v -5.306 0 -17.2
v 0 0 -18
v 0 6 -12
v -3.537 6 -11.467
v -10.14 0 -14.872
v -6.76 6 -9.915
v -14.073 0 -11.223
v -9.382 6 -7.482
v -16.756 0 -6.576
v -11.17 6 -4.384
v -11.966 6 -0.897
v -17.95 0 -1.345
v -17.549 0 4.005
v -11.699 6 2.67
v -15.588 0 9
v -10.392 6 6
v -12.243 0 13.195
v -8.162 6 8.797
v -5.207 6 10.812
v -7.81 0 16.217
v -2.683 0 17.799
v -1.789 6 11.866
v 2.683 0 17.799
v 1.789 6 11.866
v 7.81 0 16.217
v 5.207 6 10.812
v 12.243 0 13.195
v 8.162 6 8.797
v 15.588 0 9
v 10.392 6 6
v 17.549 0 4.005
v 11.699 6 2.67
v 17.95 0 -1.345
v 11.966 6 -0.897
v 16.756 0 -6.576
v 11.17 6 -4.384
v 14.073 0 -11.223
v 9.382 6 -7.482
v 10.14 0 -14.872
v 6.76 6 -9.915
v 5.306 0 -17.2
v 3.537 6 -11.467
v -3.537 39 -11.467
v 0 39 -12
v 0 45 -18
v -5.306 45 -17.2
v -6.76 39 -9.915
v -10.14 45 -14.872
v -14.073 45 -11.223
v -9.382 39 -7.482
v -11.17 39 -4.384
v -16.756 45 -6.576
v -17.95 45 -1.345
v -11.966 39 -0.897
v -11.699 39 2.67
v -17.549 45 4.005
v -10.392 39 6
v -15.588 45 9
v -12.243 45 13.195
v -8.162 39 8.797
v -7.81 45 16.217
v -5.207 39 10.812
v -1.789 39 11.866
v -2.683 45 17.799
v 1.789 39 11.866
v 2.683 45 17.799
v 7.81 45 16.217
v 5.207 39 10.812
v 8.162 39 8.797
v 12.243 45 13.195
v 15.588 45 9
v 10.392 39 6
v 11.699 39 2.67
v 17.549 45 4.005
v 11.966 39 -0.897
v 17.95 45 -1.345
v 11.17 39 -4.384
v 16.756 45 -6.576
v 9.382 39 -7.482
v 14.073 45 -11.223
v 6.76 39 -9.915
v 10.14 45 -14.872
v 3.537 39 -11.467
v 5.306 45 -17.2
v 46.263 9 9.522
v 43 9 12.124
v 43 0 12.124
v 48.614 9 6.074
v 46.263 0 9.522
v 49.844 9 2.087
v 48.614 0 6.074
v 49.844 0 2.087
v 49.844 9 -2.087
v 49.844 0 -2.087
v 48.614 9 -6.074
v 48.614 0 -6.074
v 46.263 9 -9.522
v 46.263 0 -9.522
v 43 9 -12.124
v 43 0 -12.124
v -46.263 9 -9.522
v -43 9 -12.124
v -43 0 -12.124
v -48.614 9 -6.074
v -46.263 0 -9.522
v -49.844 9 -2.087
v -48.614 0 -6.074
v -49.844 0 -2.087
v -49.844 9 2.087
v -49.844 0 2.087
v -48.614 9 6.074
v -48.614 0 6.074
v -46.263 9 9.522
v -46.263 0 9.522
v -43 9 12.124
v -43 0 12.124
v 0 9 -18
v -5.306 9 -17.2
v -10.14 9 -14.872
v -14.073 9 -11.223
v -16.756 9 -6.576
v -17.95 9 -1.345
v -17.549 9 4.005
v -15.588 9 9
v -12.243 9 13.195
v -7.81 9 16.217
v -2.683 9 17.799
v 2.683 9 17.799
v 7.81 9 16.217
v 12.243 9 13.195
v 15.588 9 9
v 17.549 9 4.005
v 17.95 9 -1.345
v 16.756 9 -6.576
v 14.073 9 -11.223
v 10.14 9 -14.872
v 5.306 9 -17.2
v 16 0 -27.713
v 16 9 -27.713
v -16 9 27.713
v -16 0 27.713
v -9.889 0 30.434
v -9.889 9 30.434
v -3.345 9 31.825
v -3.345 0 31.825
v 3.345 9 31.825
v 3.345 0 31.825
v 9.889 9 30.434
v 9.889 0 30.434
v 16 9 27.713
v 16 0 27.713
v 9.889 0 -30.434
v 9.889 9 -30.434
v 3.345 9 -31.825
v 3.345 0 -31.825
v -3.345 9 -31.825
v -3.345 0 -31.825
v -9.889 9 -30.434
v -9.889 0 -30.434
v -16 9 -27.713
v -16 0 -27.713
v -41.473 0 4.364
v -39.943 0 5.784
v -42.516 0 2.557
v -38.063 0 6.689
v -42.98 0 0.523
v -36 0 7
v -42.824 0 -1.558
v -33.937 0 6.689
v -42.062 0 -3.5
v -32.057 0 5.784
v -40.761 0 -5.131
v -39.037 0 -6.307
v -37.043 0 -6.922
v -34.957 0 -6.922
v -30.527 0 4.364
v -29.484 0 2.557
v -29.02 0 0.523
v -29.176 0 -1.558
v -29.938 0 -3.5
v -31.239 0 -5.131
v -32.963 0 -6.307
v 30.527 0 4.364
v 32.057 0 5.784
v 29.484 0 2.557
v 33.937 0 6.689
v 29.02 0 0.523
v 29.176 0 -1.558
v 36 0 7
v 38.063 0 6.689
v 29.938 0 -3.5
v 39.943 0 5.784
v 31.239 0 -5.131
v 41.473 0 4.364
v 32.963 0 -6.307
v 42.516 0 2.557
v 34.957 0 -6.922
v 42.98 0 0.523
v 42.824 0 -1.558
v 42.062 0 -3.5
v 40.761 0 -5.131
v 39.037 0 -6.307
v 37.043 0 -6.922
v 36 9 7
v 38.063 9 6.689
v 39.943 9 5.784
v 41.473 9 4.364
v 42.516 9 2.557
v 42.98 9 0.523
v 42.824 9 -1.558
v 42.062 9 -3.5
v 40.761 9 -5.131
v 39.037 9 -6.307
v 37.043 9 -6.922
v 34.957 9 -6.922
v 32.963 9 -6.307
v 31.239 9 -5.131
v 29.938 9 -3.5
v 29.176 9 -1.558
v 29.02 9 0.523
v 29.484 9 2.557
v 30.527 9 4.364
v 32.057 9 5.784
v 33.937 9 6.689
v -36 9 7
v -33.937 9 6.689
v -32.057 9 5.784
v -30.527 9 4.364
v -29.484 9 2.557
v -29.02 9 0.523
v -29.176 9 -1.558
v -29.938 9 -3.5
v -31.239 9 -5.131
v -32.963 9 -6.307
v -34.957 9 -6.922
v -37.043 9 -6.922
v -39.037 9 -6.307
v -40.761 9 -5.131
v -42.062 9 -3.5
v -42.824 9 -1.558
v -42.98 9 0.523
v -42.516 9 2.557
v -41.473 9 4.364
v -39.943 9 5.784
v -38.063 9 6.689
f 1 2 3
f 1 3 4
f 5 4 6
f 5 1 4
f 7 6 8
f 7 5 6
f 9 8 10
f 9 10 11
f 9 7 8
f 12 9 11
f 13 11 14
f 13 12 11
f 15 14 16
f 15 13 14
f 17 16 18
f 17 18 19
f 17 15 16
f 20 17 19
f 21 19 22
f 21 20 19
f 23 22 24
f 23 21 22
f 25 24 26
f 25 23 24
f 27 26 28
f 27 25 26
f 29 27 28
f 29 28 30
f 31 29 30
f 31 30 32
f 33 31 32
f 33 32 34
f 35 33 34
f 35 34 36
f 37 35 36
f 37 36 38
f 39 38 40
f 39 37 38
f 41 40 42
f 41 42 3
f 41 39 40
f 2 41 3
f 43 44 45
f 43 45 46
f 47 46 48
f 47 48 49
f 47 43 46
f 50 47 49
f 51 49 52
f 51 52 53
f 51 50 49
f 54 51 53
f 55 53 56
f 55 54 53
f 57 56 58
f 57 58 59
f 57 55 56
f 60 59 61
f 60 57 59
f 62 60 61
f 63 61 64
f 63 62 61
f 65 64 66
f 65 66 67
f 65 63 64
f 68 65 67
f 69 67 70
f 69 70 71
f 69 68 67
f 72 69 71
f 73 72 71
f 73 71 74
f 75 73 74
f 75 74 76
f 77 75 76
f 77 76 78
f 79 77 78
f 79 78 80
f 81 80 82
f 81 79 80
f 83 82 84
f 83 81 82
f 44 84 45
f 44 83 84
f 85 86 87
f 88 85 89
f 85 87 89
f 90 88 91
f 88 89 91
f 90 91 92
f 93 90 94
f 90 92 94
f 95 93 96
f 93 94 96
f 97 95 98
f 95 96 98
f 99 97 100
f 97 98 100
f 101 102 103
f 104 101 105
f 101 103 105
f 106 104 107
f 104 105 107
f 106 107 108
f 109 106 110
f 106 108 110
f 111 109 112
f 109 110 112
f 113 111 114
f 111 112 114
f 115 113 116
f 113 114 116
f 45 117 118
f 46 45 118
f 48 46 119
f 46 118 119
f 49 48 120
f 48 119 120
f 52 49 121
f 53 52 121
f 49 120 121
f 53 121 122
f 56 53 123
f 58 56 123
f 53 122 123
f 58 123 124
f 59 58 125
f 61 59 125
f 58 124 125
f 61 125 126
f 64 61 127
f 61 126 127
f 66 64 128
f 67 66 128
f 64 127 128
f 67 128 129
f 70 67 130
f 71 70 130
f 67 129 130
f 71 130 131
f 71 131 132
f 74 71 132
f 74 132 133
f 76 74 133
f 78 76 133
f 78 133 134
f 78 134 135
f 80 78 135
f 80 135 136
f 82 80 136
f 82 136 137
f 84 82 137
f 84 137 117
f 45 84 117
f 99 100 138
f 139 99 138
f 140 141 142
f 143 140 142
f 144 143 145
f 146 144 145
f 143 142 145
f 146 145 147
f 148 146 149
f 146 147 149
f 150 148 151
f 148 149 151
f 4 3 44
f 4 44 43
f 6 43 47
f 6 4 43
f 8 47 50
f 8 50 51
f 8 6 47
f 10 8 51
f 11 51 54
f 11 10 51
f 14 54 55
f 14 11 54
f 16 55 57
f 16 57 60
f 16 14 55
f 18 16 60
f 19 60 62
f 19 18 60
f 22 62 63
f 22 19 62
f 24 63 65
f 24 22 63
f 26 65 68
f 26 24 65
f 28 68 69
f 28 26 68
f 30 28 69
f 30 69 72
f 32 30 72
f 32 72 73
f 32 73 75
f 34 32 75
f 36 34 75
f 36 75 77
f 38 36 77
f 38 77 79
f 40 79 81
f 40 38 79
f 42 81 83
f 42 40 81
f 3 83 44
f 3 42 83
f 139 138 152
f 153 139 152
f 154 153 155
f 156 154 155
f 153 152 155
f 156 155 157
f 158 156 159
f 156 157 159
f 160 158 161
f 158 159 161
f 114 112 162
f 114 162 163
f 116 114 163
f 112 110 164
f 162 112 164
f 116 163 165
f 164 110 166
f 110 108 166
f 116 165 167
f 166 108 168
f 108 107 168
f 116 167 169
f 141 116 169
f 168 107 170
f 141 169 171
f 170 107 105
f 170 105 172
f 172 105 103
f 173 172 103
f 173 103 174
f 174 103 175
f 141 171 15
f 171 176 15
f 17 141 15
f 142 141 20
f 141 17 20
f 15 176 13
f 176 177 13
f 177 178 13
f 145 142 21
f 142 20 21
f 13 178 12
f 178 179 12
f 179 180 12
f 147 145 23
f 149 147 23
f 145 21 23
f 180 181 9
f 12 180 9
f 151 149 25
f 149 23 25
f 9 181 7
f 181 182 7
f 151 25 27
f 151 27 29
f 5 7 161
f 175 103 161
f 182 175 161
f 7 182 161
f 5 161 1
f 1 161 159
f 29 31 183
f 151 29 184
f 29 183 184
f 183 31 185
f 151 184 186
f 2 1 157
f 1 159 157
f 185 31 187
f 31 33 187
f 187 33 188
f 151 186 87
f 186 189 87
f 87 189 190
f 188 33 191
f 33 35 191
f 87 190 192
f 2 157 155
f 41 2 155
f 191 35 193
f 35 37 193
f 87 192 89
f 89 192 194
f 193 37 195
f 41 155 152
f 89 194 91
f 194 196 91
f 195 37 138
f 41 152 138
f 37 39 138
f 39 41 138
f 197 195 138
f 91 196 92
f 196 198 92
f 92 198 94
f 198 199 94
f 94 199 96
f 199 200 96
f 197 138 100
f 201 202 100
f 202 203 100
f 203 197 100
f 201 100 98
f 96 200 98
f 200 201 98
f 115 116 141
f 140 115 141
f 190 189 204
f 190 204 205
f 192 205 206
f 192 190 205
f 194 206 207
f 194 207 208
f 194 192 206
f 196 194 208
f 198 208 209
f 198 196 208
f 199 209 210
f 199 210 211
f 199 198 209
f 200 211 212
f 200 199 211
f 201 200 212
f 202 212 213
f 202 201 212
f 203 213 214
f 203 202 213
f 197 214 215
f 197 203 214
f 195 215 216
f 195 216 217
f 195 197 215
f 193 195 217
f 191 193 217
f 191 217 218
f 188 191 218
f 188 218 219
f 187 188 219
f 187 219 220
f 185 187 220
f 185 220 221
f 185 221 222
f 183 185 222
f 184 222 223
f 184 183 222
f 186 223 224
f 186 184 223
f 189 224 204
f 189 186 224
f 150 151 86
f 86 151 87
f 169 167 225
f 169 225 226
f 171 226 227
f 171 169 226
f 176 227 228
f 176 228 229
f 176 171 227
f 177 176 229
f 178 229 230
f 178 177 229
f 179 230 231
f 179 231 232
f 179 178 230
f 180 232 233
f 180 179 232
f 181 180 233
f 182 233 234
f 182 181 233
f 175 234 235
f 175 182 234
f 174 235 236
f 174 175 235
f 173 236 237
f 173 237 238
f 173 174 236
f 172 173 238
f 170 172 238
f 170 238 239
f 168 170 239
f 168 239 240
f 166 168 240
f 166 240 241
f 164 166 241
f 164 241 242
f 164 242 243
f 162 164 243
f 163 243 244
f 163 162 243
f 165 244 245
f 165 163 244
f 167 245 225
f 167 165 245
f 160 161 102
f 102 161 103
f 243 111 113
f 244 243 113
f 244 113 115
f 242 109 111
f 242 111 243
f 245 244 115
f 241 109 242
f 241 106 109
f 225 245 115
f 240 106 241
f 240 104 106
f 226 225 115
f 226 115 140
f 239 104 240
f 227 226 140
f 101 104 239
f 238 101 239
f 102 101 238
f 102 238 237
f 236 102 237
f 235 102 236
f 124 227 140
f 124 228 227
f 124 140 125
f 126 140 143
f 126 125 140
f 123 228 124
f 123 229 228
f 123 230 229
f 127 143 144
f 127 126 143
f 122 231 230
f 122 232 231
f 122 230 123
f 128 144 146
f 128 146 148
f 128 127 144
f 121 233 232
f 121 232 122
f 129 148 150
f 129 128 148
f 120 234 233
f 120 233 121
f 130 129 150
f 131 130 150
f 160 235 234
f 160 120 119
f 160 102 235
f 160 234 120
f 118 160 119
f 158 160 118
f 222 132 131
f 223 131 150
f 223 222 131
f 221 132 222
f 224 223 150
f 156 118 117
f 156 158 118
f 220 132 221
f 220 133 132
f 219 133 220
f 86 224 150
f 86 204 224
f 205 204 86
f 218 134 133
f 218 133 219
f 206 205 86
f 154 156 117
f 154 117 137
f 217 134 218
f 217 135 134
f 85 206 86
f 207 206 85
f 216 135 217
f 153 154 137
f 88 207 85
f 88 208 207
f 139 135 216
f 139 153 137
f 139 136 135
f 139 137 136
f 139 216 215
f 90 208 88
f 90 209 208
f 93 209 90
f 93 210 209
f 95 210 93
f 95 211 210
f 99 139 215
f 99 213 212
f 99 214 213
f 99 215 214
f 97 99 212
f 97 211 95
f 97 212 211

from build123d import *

# Parameters (mm, degrees)
SKETCH_1_R      = 7
SKETCH_1_R_2    = 18
EXTRUDE_1_DEPTH = 9
SKETCH_1_3_R    = 18
SKETCH_1_3_R_2  = 12
EXTRUDE_2_DEPTH = 45
CHAMFER_1_SIZE  = 6


with BuildPart() as part:
    # 草圖1 → 填料-伸長1 (new body)
    with BuildSketch(Plane(origin=(0, 0, 0), x_dir=(1, 0, 0), z_dir=(0, 1, 0))):
        with BuildLine():
            Line((16, -27.712812921), (43, -12.124355653))
            ThreePointArc((43, -12.124355653), (50, 0), (43, 12.124355653))
            Line((43, 12.124355653), (16, 27.712812921))
            ThreePointArc((16, 27.712812921), (0, 32), (-16, 27.712812921))
            Line((-16, 27.712812921), (-43, 12.124355653))
            ThreePointArc((-43, 12.124355653), (-50, 0), (-43, -12.124355653))
            Line((-43, -12.124355653), (-16, -27.712812921))
            ThreePointArc((-16, -27.712812921), (0, -32), (16, -27.712812921))
        make_face()
        with Locations(Location((36, 0, 0), (0, 0, 270))):
            Circle(SKETCH_1_R, mode=Mode.SUBTRACT)
        with Locations(Location((-36, 0, 0), (0, 0, 270))):
            Circle(SKETCH_1_R, mode=Mode.SUBTRACT)
        with Locations(Location((0, 0, 0), (0, 0, 270))):
            Circle(SKETCH_1_R_2, mode=Mode.SUBTRACT)
    extrude(amount=EXTRUDE_1_DEPTH)

    # 草圖1<3> → 填料-伸長2 (add)
    with BuildSketch(Plane(origin=(0, 0, 0), x_dir=(1, 0, 0), z_dir=(0, 1, 0))):
        with Locations(Location((0, 0, 0), (0, 0, 90))):
            Circle(SKETCH_1_3_R)
        with Locations(Location((0, 0, 0), (0, 0, 90))):
            Circle(SKETCH_1_3_R_2, mode=Mode.SUBTRACT)
    extrude(amount=EXTRUDE_2_DEPTH)

    # 導角1
    chamfer_1_edges = [part.edges().sort_by_distance(p)[0] for p in [
        (0, 45, 12),
        (0, 0, 12),
    ]]
    chamfer(chamfer_1_edges, length=CHAMFER_1_SIZE - 0.0001)  # a hair under: the kernel refuses the full size


solid = part.part
